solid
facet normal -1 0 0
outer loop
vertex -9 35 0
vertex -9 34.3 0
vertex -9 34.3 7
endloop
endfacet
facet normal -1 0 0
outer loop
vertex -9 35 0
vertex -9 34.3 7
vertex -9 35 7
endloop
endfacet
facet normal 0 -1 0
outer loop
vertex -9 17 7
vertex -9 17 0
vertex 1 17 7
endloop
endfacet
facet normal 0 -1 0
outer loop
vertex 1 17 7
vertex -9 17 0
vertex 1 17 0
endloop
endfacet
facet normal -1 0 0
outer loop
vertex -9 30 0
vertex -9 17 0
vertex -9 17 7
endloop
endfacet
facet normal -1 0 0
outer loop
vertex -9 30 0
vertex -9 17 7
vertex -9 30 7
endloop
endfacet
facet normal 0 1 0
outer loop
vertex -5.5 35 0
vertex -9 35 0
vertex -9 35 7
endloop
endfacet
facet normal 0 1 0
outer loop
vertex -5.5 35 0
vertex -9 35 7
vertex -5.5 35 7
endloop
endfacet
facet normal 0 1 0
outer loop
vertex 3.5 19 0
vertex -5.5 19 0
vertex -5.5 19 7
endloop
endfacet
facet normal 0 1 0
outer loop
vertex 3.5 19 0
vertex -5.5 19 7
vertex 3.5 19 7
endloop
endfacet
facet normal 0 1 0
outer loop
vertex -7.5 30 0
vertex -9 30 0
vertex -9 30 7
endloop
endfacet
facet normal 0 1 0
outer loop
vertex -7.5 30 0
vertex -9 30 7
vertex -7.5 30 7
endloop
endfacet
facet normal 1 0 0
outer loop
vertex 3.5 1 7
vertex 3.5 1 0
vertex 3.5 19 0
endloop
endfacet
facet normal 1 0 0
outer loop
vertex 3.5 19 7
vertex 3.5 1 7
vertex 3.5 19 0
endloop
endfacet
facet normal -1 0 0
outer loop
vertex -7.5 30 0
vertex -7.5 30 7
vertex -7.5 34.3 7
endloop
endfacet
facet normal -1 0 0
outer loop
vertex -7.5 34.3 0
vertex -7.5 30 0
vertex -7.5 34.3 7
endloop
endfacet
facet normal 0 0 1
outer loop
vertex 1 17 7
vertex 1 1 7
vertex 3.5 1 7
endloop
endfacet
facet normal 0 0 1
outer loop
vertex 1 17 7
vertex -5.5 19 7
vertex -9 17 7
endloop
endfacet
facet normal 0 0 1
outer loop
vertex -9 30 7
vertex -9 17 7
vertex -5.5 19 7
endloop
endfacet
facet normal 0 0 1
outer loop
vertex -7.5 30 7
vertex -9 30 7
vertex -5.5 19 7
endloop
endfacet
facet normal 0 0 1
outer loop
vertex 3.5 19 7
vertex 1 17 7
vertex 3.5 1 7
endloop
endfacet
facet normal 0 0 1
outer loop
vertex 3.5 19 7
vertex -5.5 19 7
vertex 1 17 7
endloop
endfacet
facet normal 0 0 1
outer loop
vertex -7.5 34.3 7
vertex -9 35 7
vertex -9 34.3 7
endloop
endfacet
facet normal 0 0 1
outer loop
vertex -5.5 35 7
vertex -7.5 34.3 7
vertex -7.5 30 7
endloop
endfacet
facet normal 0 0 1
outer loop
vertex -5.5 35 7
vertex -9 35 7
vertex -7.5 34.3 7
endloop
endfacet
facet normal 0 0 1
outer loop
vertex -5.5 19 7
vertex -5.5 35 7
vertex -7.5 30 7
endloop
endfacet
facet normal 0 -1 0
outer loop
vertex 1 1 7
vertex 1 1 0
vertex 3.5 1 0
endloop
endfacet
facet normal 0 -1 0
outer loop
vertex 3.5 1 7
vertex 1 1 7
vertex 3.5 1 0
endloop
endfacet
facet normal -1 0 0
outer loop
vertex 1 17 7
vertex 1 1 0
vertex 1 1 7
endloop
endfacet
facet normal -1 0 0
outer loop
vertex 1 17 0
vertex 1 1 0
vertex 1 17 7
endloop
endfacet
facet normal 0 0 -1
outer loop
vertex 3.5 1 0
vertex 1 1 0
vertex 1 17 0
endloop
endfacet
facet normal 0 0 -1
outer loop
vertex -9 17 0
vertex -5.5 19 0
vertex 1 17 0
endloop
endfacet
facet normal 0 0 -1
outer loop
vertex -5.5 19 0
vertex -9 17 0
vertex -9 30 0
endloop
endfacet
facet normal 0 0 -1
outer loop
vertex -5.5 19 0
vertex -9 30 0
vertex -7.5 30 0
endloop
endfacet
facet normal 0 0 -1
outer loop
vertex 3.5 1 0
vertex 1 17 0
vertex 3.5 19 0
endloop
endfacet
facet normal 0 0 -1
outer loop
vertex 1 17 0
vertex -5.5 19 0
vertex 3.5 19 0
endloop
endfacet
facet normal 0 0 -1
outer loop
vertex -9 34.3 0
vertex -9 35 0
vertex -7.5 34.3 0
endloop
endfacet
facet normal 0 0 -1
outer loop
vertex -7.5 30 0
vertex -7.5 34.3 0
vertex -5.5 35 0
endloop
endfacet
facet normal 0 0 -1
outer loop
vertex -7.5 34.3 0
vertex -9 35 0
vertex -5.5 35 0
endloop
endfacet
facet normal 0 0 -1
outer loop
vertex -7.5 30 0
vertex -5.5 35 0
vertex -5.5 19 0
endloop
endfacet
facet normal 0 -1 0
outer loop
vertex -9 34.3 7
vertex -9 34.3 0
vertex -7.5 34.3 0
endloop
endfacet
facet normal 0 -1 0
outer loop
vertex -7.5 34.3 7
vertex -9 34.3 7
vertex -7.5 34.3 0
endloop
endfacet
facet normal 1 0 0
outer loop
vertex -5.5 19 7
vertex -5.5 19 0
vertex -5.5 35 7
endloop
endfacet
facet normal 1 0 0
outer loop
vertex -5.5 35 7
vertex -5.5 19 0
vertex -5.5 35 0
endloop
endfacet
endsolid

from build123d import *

# Parameters (mm, degrees)
BOX016_W     = 12
BOX016_H     = 2
BOX016_DEPTH = 7
BOX018_W     = 3.5
BOX018_H     = 4.3
BOX018_DEPTH = 7
BOX017_W     = 3.5
BOX017_H     = 18
BOX017_DEPTH = 7
BOX015_W     = 2.5
BOX015_H     = 18
BOX015_DEPTH = 7


with BuildPart() as box016:
    # Box016 → Box016 (new body)
    with BuildSketch(Plane(origin=(-9, 17, 0), x_dir=(1, 0, 0), z_dir=(0, 0, 1))):
        with Locations((6, 1)):
            Rectangle(BOX016_W, BOX016_H)
    extrude(amount=BOX016_DEPTH)


with BuildPart() as box018:
    # Box018 → Box018 (new body)
    with BuildSketch(Plane(origin=(-11, 30, 0), x_dir=(1, 0, 0), z_dir=(0, 0, 1))):
        with Locations((1.75, 2.15)):
            Rectangle(BOX018_W, BOX018_H)
    extrude(amount=BOX018_DEPTH)


with BuildPart() as cut043:
    # Box017 → Box017 (new body)
    with BuildSketch(Plane(origin=(-9, 17, 0), x_dir=(1, 0, 0), z_dir=(0, 0, 1))):
        with Locations((1.75, 9)):
            Rectangle(BOX017_W, BOX017_H)
    extrude(amount=BOX017_DEPTH)

    # Cut043: cut Box018
    add(box018.part, mode=Mode.SUBTRACT)


with BuildPart() as fusion020:
    # Box015 → Box015 (new body)
    with BuildSketch(Plane(origin=(1, 1, 0), x_dir=(1, 0, 0), z_dir=(0, 0, 1))):
        with Locations((1.25, 9)):
            Rectangle(BOX015_W, BOX015_H)
    extrude(amount=BOX015_DEPTH)

    # Fusion020: union Box016, Cut043
    add(box016.part)
    add(cut043.part)


solid = fusion020.part
